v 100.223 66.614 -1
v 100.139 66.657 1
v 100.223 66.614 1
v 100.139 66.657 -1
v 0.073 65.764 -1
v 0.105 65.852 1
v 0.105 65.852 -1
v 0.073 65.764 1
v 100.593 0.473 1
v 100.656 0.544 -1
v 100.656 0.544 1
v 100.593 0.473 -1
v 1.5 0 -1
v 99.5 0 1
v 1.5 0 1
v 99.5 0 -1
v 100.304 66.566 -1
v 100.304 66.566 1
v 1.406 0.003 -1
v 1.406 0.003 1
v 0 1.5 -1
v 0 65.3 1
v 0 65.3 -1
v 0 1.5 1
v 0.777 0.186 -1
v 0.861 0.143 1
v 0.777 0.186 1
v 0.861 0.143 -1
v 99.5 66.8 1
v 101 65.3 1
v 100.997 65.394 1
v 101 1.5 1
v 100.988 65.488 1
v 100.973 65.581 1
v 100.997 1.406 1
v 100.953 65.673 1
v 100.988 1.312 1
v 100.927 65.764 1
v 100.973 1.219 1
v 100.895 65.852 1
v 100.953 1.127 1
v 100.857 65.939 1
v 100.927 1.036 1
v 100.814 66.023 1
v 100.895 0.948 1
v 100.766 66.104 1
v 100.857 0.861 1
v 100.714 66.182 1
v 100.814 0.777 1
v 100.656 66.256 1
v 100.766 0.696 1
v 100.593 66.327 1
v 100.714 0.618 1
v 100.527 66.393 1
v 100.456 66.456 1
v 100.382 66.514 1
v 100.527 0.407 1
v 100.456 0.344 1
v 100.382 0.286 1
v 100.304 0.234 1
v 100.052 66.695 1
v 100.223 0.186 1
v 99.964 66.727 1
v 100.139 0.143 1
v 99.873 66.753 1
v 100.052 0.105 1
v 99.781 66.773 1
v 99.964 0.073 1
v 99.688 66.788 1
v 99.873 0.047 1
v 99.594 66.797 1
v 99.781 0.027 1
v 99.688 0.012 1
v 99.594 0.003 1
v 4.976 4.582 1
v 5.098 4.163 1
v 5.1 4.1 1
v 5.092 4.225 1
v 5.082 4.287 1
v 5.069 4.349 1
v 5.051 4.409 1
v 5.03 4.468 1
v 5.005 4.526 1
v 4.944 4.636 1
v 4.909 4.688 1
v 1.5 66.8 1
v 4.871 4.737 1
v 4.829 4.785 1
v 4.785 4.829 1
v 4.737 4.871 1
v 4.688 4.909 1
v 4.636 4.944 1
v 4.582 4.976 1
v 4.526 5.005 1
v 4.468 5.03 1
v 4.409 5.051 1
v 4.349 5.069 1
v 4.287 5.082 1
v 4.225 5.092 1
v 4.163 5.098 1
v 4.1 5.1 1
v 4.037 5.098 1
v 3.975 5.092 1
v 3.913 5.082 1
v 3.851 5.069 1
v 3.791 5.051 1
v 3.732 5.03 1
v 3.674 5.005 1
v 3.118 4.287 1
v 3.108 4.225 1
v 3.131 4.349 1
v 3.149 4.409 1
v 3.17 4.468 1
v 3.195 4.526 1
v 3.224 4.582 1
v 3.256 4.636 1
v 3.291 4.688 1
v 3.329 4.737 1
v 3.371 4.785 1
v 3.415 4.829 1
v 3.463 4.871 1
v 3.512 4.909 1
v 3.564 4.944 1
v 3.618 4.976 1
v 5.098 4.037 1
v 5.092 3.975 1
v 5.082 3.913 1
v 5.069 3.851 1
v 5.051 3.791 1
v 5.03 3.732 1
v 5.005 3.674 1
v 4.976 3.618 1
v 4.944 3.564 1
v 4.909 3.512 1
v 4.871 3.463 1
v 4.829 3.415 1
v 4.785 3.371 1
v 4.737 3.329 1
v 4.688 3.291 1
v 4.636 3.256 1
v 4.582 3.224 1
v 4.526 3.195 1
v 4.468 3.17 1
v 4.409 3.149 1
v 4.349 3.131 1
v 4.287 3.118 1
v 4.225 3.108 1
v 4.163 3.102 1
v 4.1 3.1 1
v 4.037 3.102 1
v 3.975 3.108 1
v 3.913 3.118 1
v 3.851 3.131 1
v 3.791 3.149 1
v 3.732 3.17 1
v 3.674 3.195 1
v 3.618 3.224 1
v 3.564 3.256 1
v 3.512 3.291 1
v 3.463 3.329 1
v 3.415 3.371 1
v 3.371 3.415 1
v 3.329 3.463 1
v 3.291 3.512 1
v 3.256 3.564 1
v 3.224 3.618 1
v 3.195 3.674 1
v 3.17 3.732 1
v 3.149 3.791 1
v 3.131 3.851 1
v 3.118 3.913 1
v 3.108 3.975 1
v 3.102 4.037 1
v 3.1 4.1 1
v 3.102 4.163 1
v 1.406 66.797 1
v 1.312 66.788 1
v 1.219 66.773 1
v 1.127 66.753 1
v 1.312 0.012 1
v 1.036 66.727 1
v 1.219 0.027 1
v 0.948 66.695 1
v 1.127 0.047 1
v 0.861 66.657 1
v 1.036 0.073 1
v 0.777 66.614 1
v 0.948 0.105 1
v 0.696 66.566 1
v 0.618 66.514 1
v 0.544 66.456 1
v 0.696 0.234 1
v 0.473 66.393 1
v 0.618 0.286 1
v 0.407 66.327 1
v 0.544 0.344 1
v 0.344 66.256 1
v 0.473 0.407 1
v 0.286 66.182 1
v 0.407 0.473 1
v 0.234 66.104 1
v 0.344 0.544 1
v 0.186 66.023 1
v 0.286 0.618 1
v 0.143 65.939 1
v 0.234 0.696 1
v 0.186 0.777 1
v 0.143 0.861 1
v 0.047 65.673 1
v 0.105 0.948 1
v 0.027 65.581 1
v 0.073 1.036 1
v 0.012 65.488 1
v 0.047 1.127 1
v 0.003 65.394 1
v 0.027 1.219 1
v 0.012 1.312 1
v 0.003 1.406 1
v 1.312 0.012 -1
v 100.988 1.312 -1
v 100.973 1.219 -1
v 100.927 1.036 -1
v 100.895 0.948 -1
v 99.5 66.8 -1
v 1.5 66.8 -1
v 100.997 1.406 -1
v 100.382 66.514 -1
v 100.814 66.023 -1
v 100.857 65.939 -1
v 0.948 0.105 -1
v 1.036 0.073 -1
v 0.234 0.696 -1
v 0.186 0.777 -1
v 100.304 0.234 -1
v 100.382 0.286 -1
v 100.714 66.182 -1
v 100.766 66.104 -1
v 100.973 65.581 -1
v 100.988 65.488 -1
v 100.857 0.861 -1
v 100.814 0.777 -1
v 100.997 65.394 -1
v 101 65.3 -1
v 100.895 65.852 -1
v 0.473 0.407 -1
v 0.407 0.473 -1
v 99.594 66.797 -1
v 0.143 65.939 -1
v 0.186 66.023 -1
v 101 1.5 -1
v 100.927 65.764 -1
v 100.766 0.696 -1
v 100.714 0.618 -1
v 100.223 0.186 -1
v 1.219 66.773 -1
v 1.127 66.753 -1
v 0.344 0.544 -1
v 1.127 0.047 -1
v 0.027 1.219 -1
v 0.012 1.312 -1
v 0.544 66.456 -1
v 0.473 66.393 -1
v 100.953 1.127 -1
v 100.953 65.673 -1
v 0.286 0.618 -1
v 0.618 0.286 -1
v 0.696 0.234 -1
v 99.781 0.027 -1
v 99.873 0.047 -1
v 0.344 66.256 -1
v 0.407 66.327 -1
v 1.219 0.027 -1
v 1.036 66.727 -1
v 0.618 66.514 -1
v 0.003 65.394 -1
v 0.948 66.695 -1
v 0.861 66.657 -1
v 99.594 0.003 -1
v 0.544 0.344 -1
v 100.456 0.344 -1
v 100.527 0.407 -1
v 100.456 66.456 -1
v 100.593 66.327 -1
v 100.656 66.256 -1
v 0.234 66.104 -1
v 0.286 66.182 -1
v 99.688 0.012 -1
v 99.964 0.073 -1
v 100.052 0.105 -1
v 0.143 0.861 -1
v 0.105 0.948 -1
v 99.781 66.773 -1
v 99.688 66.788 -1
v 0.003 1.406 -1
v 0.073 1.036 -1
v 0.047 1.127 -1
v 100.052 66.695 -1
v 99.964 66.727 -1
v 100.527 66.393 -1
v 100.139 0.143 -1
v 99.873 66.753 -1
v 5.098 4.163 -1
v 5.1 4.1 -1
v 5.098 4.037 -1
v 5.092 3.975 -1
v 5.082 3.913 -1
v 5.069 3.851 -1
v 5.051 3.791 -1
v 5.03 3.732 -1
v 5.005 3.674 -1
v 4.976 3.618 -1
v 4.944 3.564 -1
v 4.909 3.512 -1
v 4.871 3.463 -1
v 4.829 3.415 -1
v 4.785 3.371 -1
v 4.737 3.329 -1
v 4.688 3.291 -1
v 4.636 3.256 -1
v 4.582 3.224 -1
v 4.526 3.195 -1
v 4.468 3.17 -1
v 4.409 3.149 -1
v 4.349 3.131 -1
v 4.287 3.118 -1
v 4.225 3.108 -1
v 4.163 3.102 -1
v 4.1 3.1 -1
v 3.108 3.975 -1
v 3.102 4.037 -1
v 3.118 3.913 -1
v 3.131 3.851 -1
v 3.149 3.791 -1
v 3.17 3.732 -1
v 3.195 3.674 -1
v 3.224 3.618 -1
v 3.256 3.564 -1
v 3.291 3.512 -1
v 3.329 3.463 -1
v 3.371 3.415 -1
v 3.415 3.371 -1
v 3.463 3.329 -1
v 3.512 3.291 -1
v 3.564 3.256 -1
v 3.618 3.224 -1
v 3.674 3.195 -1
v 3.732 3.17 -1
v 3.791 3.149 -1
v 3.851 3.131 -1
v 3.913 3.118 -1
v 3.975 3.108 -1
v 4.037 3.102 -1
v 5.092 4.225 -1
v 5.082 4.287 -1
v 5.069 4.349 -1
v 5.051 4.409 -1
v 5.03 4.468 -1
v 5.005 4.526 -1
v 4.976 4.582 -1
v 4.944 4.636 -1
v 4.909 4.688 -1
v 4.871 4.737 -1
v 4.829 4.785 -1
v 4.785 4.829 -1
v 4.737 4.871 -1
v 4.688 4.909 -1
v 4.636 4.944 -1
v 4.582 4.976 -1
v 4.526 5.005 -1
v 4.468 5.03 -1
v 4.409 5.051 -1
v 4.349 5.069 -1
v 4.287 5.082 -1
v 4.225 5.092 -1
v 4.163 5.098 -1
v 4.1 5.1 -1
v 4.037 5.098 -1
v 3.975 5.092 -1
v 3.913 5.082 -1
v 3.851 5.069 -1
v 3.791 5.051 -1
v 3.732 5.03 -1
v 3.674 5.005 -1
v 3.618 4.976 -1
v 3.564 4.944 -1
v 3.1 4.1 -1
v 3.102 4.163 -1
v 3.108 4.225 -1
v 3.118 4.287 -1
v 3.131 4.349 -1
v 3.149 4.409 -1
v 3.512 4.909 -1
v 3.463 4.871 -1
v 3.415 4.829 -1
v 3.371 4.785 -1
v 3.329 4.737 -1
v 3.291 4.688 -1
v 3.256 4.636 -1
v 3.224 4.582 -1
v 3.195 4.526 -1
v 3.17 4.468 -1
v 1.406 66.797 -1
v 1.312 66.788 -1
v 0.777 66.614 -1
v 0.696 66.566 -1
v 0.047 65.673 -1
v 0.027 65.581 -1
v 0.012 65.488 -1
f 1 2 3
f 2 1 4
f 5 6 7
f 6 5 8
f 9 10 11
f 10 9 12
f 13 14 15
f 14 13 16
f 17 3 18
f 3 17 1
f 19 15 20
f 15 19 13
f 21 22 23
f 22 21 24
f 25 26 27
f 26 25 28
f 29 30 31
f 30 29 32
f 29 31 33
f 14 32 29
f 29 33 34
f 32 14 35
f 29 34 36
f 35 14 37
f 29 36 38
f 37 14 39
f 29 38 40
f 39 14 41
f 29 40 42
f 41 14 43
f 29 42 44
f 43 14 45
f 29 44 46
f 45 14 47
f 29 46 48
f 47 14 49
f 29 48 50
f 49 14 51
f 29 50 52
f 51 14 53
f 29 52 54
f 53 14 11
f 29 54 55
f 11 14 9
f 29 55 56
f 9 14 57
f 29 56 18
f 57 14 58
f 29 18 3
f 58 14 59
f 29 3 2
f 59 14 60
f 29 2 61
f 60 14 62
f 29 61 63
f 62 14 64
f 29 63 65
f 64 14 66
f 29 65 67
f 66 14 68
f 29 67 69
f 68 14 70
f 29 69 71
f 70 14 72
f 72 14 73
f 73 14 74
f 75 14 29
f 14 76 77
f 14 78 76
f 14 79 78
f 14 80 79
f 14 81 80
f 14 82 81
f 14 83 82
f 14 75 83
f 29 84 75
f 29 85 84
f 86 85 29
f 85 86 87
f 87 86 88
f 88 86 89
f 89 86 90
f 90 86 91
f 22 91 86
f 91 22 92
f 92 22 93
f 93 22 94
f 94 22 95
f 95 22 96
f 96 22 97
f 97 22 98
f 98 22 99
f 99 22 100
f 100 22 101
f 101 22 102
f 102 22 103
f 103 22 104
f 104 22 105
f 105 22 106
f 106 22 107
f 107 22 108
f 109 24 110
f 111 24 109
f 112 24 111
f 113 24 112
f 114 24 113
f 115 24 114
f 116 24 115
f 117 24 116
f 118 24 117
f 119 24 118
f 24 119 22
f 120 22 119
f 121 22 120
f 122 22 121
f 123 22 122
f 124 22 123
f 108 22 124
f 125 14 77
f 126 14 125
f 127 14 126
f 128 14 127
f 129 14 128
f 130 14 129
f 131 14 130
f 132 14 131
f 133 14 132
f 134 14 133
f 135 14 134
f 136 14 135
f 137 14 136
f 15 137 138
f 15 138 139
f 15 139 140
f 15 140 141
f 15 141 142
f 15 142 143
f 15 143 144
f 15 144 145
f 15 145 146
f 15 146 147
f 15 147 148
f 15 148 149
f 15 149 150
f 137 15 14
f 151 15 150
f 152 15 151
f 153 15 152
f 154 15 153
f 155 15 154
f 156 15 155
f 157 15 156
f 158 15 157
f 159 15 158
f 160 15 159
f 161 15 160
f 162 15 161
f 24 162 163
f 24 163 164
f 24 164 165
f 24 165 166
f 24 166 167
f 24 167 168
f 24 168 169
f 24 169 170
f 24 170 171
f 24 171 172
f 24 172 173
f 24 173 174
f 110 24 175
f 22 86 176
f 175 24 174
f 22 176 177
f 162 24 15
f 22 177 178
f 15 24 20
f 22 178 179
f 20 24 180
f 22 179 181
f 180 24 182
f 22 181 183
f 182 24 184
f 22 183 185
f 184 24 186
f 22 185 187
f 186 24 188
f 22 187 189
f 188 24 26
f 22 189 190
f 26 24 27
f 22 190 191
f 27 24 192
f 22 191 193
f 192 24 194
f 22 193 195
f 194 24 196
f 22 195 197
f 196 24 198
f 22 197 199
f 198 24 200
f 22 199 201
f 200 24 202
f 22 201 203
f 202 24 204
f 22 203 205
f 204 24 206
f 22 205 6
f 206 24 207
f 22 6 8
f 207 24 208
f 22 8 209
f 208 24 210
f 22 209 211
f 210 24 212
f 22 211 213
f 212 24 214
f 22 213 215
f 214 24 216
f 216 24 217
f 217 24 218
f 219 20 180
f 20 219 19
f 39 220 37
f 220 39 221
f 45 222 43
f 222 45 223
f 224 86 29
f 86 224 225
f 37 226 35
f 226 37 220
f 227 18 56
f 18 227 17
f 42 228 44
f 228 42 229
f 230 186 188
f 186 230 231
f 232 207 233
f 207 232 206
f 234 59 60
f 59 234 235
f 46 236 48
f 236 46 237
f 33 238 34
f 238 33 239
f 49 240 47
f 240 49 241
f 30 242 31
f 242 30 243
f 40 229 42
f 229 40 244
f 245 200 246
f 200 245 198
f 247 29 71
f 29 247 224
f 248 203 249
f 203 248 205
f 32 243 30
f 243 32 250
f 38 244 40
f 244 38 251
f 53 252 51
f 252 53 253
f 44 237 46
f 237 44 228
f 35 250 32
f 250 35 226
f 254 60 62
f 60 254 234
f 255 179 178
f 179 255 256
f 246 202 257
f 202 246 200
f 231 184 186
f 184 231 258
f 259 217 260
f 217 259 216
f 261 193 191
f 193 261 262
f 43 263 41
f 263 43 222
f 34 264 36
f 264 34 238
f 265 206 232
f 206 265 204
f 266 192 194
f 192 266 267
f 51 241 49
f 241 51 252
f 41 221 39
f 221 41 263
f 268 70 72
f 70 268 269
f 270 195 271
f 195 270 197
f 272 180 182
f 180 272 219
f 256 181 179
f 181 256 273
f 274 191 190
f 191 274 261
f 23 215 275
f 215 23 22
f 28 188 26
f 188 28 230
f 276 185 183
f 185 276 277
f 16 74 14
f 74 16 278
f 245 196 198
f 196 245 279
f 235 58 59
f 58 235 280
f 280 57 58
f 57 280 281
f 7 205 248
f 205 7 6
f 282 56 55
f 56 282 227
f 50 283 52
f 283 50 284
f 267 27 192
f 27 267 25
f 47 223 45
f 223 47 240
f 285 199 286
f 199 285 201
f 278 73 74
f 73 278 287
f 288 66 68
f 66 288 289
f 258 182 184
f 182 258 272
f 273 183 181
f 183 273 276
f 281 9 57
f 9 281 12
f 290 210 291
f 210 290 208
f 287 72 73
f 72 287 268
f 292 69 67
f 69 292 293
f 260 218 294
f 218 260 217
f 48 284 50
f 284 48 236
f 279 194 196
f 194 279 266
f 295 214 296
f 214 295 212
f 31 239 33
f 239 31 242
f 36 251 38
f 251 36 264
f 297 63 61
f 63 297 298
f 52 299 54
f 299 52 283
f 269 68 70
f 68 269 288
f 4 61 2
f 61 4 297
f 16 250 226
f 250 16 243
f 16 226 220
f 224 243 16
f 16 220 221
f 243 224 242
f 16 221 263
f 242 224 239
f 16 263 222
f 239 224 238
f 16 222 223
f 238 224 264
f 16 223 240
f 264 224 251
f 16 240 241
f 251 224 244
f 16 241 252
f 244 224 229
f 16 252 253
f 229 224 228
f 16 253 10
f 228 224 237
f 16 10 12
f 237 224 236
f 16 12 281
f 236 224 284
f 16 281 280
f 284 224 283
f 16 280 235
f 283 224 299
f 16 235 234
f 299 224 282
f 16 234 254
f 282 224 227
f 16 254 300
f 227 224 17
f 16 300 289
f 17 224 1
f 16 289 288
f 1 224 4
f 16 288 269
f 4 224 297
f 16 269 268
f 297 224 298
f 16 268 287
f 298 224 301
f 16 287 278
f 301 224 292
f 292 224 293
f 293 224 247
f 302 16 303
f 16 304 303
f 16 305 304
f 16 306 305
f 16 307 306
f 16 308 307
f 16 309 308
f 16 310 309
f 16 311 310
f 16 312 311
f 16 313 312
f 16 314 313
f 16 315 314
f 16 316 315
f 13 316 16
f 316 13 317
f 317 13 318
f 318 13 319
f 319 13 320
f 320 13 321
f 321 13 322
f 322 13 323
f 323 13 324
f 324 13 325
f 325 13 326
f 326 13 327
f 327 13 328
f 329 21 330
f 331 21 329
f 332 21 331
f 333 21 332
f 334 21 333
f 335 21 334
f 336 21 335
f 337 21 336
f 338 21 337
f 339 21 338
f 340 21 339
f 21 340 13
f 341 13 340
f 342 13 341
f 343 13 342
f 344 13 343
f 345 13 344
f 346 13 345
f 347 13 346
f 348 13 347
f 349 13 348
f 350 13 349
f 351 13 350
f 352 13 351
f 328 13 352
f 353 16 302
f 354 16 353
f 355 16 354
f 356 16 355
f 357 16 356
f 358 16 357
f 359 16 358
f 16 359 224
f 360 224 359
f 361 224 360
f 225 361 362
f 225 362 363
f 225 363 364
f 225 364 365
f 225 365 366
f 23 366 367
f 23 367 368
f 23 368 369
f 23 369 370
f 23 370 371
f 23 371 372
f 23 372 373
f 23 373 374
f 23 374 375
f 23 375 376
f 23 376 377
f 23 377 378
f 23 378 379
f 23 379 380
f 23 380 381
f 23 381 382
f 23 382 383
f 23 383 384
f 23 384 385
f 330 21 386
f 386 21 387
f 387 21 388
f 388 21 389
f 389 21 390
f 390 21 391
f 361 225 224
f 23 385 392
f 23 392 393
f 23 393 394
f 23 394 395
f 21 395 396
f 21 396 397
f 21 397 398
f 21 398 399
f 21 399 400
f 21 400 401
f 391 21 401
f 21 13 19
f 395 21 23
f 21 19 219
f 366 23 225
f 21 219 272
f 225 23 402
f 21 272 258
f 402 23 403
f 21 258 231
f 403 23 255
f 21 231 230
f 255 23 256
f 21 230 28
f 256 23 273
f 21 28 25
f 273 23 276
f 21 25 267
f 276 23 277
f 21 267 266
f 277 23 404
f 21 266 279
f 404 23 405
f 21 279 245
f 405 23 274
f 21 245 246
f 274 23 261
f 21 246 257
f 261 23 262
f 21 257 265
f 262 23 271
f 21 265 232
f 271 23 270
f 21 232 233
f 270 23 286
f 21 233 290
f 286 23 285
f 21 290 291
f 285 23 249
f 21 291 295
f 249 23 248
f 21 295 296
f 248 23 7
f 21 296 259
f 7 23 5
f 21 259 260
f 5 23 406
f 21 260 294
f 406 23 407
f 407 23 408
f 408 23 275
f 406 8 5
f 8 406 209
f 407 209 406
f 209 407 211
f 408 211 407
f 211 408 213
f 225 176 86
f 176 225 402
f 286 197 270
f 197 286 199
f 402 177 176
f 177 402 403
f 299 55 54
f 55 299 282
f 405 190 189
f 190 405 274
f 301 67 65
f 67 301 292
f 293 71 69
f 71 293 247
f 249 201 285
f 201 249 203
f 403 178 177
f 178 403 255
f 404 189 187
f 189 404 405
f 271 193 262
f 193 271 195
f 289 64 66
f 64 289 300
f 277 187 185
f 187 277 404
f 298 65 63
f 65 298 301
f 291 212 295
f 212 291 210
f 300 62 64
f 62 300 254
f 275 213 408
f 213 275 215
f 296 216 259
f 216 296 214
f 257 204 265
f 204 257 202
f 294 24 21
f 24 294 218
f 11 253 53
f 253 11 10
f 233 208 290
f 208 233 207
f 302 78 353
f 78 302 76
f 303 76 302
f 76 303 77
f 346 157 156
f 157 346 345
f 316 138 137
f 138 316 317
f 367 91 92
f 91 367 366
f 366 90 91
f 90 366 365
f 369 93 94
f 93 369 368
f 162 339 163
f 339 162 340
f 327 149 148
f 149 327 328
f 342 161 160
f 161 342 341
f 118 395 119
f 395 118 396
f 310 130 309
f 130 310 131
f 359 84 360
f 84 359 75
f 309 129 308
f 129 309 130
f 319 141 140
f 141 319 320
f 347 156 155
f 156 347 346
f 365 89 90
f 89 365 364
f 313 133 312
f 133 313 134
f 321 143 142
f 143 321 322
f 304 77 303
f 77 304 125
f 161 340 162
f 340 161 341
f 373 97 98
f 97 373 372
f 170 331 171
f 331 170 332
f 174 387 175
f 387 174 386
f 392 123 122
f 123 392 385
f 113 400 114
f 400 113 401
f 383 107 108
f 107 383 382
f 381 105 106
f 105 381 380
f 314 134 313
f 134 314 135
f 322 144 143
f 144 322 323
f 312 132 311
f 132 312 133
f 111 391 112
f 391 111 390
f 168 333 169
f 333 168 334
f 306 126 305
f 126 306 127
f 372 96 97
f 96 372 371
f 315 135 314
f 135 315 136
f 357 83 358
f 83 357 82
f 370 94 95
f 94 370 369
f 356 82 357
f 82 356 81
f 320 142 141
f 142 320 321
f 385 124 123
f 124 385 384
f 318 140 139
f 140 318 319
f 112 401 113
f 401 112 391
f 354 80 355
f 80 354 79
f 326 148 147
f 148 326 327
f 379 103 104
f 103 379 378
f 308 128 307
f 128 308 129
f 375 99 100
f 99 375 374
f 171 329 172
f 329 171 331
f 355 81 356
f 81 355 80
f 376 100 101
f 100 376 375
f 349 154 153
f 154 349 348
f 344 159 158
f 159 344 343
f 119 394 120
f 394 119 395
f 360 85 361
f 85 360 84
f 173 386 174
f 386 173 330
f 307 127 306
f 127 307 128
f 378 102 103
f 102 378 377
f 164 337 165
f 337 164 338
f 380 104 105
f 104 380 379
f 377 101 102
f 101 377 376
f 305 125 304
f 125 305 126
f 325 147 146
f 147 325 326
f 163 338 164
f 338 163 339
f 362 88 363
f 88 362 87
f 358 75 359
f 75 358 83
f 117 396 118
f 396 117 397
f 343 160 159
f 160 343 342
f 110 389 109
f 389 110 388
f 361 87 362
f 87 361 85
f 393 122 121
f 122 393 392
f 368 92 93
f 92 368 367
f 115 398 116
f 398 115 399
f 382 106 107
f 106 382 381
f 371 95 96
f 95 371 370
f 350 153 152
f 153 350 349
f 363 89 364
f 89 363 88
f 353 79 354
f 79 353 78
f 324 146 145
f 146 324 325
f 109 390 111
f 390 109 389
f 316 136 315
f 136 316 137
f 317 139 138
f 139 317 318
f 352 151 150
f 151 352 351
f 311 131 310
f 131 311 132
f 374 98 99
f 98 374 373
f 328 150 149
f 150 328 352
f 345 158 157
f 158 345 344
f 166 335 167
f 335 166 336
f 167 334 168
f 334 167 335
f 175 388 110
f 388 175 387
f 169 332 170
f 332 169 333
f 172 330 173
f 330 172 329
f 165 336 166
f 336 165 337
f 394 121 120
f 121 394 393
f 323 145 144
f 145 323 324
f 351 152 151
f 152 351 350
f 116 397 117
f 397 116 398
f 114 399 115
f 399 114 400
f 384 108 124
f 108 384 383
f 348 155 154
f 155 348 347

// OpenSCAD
$fn=100;
screwX=91.5;
screwY=56.5;
screwD=2;

//inside of midleton wooden box with double doors
totHeight = 2 ;
totWidth = 101 ;
totDepth = 66.8 ;
dimensions = [ totWidth, totDepth, totHeight] ;
wiggle = [0, 0, 0] ;
volume = dimensions + wiggle ;
*cube(volume);
// Corner strength
cornerD = 3 ;
Blob=[cornerD,cornerD,volume.z];
DIM = volume ;

FL = [0, 0, 0] ;
FR = [DIM.x - Blob.x, 0, 0] ;
BR = [DIM.x - Blob.x, DIM.y -Blob.y, 0] ;
BL = [0, DIM.y -Blob.y, 0] ;

// List of corners
Corners = [FL,FR,BL,BR];

difference() {
	translate([Blob.x/2,Blob.y/2,0]) hull() {
		for (corner = Corners) {
			echo(corner);
			translate(corner) cylinder(h=DIM.z,d=Blob.x,center=true);
		}
	}
	translate([4.1,4.1,0]) cylinder(h=DIM.z+.1,d=screwD,center=true);
}
